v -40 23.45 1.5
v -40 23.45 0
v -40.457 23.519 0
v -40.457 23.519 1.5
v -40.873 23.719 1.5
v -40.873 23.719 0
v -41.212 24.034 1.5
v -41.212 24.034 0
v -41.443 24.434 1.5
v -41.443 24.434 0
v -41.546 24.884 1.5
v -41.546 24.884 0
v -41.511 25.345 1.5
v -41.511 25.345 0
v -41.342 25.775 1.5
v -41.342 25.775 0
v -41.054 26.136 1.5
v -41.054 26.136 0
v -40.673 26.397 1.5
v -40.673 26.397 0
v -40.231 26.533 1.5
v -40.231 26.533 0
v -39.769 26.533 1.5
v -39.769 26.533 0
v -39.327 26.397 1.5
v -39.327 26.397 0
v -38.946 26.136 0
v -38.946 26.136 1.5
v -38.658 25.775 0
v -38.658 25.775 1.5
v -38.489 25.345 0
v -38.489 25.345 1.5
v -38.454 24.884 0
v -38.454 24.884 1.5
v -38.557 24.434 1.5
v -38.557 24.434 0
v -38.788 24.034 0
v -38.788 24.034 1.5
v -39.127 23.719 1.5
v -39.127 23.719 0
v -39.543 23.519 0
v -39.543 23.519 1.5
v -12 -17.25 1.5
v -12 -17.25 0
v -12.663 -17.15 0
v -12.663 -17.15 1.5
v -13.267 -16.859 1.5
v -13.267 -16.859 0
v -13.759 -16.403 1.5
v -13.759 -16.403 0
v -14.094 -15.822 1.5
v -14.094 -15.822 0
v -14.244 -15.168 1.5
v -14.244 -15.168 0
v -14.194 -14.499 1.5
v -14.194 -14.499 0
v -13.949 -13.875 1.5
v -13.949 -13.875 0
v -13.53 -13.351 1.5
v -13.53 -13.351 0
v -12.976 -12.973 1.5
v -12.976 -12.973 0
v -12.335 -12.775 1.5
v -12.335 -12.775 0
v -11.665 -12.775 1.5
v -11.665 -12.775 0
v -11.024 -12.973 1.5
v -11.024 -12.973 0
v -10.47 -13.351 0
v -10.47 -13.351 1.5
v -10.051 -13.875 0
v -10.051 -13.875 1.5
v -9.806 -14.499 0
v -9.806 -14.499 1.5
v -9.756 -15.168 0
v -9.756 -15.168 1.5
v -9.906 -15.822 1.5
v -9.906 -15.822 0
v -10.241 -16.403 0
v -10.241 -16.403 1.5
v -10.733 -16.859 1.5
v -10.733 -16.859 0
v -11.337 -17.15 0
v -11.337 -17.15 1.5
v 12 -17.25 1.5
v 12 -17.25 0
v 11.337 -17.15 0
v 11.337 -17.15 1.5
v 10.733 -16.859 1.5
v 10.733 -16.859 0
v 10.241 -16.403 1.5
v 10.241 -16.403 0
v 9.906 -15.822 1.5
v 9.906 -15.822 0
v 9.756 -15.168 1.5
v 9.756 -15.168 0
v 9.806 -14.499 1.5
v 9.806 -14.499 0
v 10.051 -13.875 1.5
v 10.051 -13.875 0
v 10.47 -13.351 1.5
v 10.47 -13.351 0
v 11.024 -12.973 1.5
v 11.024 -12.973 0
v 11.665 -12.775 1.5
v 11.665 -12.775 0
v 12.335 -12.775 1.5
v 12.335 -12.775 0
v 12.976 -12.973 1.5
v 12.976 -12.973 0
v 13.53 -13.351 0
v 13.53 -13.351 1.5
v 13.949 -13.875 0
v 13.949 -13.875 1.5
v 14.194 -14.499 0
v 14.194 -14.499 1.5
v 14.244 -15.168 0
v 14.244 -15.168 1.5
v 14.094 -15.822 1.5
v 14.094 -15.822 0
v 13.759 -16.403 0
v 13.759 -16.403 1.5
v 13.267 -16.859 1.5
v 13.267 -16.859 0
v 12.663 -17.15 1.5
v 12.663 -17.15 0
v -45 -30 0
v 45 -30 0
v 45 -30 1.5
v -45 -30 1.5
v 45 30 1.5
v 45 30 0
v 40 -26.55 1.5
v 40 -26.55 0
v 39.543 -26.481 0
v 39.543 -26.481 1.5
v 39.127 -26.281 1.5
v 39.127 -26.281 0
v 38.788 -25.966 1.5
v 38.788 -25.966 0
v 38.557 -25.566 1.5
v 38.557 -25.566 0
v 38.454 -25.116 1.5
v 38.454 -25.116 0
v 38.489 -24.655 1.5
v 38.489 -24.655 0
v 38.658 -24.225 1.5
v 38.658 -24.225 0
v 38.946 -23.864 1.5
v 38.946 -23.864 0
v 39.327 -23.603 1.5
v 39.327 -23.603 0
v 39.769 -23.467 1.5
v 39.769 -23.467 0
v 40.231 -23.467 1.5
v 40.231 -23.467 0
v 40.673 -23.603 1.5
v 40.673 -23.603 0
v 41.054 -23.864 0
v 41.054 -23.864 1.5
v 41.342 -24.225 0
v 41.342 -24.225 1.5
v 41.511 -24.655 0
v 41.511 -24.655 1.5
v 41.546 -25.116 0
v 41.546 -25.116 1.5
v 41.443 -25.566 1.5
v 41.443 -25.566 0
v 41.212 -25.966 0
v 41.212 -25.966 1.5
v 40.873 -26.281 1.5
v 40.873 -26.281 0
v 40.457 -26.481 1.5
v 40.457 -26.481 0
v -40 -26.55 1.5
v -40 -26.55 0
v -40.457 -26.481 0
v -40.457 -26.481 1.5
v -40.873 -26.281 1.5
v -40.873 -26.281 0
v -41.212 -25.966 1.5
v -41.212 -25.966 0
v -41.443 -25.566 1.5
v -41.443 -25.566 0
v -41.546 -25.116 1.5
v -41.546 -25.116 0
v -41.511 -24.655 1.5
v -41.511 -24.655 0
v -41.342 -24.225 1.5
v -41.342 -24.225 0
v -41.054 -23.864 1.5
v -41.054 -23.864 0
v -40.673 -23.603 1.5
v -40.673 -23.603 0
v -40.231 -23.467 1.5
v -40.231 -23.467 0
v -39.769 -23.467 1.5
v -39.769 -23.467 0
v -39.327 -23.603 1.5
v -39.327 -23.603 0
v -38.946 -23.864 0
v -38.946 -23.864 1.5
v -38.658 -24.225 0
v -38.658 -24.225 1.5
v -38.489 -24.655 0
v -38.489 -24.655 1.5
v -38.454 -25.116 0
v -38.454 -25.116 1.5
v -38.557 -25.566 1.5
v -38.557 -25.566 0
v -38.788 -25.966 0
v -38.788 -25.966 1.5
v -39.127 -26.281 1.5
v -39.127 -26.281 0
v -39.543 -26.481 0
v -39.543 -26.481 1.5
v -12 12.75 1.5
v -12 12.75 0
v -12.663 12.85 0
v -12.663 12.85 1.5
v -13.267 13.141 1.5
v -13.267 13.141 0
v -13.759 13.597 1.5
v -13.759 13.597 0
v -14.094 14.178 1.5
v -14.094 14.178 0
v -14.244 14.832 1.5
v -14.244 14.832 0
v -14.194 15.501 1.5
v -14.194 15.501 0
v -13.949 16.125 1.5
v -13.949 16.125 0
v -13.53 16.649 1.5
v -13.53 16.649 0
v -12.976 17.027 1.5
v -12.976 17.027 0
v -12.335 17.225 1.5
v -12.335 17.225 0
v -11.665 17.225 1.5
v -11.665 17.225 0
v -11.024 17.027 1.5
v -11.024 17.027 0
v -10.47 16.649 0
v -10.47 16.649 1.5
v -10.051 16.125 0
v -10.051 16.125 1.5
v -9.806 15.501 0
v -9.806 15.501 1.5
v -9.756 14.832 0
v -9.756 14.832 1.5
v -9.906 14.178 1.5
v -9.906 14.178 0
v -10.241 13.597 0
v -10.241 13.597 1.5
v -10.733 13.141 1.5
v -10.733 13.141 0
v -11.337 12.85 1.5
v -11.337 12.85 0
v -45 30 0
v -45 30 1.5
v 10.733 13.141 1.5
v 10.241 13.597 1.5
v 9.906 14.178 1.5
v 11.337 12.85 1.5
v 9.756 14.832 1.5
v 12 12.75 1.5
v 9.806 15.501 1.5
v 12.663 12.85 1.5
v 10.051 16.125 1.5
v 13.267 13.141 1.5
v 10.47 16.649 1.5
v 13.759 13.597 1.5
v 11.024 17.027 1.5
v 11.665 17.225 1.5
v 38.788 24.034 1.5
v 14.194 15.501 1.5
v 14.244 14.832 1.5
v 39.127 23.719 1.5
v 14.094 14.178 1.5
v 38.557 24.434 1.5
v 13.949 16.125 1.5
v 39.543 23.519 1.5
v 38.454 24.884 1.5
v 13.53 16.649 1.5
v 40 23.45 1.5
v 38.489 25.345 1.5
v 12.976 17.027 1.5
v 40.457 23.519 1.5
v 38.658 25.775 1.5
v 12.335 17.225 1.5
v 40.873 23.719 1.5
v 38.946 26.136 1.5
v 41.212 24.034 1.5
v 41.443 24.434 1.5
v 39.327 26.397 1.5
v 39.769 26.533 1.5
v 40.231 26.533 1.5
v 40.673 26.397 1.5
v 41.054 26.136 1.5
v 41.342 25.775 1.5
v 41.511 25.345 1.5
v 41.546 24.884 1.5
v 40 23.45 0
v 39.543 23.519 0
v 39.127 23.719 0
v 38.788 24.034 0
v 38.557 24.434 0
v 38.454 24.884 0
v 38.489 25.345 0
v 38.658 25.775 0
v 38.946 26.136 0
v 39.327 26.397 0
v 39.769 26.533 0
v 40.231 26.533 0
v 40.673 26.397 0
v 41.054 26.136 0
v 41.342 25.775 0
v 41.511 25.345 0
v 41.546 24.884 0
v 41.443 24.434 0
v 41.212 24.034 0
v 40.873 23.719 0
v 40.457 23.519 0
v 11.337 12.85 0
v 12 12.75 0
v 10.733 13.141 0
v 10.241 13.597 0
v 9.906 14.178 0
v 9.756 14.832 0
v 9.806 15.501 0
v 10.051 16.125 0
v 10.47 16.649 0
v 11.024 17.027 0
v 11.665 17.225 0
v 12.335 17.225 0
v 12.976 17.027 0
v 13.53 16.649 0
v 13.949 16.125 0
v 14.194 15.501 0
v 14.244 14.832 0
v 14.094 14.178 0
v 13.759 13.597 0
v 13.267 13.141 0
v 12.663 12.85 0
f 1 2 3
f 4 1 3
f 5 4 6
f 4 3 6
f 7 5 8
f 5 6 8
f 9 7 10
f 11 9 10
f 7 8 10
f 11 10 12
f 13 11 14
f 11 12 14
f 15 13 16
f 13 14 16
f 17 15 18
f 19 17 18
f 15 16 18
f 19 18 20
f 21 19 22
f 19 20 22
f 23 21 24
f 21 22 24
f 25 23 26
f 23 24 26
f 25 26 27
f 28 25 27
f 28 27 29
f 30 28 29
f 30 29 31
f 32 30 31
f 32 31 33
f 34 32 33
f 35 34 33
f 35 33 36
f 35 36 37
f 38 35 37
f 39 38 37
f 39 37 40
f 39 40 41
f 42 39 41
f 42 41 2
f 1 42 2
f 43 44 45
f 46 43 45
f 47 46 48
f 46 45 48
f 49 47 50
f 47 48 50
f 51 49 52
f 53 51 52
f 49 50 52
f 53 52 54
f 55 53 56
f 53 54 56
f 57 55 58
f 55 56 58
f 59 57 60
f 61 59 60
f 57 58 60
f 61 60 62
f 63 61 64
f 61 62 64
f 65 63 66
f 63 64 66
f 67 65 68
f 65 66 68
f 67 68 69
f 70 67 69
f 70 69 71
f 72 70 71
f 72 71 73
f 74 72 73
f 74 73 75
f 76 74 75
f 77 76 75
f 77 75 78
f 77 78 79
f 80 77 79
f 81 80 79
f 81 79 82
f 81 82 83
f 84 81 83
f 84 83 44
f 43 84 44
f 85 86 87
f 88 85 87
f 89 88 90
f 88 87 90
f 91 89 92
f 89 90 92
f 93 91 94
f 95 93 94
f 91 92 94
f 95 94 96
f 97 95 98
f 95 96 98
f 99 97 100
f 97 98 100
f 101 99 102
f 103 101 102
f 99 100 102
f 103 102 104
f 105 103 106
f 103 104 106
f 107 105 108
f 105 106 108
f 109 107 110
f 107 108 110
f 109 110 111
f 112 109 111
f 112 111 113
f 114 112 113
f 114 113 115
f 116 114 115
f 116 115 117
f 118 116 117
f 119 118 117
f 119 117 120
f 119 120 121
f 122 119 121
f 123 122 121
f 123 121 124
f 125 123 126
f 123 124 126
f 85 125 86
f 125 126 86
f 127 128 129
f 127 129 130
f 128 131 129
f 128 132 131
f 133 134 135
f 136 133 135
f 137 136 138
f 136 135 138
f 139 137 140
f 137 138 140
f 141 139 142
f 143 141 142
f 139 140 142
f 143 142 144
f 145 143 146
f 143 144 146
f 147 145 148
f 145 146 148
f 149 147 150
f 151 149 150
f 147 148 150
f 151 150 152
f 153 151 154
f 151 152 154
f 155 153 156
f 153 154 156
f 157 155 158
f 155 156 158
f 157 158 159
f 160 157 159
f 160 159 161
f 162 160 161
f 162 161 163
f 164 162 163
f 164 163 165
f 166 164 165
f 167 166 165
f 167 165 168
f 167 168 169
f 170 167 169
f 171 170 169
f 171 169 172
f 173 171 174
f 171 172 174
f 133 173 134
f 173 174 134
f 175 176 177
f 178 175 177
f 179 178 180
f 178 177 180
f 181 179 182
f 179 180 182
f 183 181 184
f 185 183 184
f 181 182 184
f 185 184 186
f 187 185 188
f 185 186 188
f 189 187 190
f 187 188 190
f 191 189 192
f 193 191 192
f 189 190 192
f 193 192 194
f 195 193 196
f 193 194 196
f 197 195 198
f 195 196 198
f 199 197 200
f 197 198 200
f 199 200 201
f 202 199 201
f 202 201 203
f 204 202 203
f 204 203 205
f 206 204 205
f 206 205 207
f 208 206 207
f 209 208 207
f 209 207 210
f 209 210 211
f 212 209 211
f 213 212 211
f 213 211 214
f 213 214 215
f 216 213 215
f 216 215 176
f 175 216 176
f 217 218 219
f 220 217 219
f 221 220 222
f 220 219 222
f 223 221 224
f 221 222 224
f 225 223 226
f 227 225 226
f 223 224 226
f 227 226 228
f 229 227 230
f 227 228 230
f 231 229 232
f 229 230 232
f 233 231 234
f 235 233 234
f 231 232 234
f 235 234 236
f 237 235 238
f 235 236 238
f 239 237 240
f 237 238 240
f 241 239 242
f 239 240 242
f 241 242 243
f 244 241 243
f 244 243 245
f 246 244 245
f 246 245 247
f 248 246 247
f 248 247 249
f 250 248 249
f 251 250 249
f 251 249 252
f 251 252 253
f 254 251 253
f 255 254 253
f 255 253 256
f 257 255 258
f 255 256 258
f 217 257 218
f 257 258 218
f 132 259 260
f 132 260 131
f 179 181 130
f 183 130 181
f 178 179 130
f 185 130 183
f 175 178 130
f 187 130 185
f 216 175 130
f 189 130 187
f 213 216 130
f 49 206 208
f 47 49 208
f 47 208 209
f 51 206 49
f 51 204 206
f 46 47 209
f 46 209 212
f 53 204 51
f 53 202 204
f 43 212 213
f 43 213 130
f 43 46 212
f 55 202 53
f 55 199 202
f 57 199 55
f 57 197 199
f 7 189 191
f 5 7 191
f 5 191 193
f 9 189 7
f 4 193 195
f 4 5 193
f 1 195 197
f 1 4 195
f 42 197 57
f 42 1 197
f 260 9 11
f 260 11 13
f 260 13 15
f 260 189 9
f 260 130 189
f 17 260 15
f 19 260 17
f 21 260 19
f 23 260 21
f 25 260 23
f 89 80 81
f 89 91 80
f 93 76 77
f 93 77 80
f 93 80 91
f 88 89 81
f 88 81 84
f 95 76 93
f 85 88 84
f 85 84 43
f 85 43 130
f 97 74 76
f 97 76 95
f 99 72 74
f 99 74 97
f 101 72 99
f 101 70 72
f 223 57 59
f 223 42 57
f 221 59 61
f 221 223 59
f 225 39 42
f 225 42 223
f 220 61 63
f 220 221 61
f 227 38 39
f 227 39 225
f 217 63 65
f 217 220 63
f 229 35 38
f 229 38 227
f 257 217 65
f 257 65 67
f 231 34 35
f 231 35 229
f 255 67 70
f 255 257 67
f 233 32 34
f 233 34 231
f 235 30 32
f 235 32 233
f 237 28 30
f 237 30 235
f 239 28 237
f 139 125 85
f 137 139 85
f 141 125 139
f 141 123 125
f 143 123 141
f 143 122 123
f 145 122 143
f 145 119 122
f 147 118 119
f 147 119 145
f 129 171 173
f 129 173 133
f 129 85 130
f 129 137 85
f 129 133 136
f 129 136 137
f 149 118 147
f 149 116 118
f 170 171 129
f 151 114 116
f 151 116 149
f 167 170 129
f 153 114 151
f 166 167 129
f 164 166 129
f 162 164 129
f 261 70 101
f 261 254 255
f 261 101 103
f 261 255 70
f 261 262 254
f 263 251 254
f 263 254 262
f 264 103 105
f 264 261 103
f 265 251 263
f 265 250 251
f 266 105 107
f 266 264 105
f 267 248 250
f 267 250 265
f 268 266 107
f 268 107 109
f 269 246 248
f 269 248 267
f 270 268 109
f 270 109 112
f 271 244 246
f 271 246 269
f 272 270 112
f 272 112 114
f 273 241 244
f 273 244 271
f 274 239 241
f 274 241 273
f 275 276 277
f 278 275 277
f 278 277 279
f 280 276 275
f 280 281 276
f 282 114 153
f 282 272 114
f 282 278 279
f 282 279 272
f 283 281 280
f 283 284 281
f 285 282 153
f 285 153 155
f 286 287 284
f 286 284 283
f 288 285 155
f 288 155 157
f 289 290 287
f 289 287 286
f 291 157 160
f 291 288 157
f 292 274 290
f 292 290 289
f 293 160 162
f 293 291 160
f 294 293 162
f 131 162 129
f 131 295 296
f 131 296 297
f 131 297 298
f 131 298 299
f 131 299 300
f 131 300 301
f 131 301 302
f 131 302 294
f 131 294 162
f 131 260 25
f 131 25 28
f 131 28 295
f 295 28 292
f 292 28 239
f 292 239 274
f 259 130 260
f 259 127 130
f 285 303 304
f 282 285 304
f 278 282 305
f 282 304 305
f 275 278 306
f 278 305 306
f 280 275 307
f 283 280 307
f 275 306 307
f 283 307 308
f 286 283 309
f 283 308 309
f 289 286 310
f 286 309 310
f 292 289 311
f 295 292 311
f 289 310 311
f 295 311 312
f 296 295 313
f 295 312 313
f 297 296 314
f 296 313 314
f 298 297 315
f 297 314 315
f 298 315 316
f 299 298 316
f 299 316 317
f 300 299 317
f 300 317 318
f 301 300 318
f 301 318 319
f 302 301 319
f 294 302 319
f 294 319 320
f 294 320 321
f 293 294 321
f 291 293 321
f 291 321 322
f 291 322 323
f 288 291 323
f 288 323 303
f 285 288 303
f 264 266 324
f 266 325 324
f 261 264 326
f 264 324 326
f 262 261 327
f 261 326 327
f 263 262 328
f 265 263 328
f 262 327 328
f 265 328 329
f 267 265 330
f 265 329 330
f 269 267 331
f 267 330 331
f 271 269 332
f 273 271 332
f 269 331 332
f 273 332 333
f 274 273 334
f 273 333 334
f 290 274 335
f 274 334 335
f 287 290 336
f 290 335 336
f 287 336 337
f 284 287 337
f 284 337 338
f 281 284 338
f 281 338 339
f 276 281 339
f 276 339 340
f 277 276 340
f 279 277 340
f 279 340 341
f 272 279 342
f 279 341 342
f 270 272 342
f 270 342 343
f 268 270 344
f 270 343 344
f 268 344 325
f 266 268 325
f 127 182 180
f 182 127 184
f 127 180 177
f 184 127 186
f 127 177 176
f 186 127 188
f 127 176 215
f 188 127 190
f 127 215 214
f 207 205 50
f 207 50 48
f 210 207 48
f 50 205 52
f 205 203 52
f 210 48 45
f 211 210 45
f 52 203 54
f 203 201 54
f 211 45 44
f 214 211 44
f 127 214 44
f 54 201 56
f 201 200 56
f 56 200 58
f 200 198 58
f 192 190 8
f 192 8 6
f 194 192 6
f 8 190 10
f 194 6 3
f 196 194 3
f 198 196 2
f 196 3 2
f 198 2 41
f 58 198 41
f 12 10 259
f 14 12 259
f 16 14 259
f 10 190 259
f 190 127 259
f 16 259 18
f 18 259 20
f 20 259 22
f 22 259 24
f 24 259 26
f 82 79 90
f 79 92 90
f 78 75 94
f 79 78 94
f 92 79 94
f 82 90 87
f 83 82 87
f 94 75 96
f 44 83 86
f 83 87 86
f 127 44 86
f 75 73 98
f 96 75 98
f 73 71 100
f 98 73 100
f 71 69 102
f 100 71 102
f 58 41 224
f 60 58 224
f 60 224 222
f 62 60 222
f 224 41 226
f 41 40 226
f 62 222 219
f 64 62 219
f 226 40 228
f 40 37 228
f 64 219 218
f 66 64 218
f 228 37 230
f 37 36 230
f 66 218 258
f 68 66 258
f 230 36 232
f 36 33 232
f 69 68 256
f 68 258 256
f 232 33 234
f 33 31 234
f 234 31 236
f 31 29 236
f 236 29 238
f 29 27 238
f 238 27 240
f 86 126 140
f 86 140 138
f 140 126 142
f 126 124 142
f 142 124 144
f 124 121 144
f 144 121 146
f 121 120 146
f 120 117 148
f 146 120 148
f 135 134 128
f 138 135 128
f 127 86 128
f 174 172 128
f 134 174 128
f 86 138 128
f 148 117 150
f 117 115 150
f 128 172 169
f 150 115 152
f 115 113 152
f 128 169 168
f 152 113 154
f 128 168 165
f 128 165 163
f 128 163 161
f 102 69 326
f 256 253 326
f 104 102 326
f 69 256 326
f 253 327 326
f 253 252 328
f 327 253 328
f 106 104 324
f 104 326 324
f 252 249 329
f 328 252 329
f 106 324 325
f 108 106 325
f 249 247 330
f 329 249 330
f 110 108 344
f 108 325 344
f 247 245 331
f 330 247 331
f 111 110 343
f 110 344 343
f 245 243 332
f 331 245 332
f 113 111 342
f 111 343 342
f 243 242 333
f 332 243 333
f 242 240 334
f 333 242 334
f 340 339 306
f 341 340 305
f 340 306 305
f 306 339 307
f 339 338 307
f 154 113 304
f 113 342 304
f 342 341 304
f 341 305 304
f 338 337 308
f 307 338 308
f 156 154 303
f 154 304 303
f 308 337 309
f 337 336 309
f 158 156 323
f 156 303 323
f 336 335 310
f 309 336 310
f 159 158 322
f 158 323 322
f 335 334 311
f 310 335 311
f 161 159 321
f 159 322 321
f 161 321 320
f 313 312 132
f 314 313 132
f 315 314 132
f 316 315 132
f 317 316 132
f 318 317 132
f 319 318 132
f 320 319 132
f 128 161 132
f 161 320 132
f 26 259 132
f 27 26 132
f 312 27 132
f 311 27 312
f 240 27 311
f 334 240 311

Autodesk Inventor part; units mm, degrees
ref_plane "YZ Plane" through (0, 0, 0) normal (1, 0, 0) x (0, 1, 0)
ref_plane "XZ Plane" through (0, 0, 0) normal (0, 1, 0) x (-1, 0, 0)
ref_plane "XY Plane" through (0, 0, 0) normal (0, 0, 1) x (1, 0, 0)
sketch "スケッチ12" plane through (0, 0, 0) normal (0, 0, 1) x (1, 0, 0)
  line L0 (-45, 30) -> (45, 30)
  line L1 (45, 30) -> (45, -30)
  line L2 (45, -30) -> (-45, -30)
  line L3 (-45, -30) -> (-45, 30)
  line L4 (-45, 30) -> (45, -30) construction
  line L5 (45, 30) -> (-45, -30) construction
  point P0 (0, 0)
  dimension "d38" = 90
  dimension "d39" = 60
extrude "押し出し5" add sketch "スケッチ12" along normal blind 1.5
sketch "スケッチ13" plane through (0, 0, 1.5) normal (0, 0, 1) x (1, 0, 0)
  line L0 (-45, 30) -> (-45, -30) projected
  line L1 (45, -30) -> (45, 30) projected
  line L2 (45, 30) -> (-45, 30) projected
  line L3 (-45, -30) -> (45, -30) projected
  point P0 (0, 0)
  point P1 (-40, 25)
  point P2 (-40, -25)
  point P3 (40, -25)
  point P4 (40, 25)
  dimension "d60" = 5
  dimension "d61" = 5
  dimension "d62" = 5
  dimension "d63" = 5
hole "穴5" at (-40, 25, 1.5) at (-40, -25, 1.5) at (40, -25, 1.5) at (40, 25, 1.5) direction (0, 0, -1) diameter 3.1 end through all
sketch "スケッチ14" plane through (0, 0, 1.5) normal (0, 0, 1) x (1, 0, 0)
  point P0 (0, 0)
  point P1 (-12, 15)
  point P2 (12, 15)
  point P3 (-12, -15)
  point P4 (12, -15)
  dimension "d56" = 15
  dimension "d57" = 15
  dimension "d58" = 15
  dimension "d59" = 15
  dimension "d64" = 12
  dimension "d65" = 12
  dimension "d66" = 12
  dimension "d67" = 12
hole "穴6" at (-12, 15, 1.5) at (12, 15, 1.5) at (-12, -15, 1.5) at (12, -15, 1.5) direction (0, 0, -1) diameter 4.5 end through all
properties part number "キャスター調節板" material "アルミニウム 6061"
